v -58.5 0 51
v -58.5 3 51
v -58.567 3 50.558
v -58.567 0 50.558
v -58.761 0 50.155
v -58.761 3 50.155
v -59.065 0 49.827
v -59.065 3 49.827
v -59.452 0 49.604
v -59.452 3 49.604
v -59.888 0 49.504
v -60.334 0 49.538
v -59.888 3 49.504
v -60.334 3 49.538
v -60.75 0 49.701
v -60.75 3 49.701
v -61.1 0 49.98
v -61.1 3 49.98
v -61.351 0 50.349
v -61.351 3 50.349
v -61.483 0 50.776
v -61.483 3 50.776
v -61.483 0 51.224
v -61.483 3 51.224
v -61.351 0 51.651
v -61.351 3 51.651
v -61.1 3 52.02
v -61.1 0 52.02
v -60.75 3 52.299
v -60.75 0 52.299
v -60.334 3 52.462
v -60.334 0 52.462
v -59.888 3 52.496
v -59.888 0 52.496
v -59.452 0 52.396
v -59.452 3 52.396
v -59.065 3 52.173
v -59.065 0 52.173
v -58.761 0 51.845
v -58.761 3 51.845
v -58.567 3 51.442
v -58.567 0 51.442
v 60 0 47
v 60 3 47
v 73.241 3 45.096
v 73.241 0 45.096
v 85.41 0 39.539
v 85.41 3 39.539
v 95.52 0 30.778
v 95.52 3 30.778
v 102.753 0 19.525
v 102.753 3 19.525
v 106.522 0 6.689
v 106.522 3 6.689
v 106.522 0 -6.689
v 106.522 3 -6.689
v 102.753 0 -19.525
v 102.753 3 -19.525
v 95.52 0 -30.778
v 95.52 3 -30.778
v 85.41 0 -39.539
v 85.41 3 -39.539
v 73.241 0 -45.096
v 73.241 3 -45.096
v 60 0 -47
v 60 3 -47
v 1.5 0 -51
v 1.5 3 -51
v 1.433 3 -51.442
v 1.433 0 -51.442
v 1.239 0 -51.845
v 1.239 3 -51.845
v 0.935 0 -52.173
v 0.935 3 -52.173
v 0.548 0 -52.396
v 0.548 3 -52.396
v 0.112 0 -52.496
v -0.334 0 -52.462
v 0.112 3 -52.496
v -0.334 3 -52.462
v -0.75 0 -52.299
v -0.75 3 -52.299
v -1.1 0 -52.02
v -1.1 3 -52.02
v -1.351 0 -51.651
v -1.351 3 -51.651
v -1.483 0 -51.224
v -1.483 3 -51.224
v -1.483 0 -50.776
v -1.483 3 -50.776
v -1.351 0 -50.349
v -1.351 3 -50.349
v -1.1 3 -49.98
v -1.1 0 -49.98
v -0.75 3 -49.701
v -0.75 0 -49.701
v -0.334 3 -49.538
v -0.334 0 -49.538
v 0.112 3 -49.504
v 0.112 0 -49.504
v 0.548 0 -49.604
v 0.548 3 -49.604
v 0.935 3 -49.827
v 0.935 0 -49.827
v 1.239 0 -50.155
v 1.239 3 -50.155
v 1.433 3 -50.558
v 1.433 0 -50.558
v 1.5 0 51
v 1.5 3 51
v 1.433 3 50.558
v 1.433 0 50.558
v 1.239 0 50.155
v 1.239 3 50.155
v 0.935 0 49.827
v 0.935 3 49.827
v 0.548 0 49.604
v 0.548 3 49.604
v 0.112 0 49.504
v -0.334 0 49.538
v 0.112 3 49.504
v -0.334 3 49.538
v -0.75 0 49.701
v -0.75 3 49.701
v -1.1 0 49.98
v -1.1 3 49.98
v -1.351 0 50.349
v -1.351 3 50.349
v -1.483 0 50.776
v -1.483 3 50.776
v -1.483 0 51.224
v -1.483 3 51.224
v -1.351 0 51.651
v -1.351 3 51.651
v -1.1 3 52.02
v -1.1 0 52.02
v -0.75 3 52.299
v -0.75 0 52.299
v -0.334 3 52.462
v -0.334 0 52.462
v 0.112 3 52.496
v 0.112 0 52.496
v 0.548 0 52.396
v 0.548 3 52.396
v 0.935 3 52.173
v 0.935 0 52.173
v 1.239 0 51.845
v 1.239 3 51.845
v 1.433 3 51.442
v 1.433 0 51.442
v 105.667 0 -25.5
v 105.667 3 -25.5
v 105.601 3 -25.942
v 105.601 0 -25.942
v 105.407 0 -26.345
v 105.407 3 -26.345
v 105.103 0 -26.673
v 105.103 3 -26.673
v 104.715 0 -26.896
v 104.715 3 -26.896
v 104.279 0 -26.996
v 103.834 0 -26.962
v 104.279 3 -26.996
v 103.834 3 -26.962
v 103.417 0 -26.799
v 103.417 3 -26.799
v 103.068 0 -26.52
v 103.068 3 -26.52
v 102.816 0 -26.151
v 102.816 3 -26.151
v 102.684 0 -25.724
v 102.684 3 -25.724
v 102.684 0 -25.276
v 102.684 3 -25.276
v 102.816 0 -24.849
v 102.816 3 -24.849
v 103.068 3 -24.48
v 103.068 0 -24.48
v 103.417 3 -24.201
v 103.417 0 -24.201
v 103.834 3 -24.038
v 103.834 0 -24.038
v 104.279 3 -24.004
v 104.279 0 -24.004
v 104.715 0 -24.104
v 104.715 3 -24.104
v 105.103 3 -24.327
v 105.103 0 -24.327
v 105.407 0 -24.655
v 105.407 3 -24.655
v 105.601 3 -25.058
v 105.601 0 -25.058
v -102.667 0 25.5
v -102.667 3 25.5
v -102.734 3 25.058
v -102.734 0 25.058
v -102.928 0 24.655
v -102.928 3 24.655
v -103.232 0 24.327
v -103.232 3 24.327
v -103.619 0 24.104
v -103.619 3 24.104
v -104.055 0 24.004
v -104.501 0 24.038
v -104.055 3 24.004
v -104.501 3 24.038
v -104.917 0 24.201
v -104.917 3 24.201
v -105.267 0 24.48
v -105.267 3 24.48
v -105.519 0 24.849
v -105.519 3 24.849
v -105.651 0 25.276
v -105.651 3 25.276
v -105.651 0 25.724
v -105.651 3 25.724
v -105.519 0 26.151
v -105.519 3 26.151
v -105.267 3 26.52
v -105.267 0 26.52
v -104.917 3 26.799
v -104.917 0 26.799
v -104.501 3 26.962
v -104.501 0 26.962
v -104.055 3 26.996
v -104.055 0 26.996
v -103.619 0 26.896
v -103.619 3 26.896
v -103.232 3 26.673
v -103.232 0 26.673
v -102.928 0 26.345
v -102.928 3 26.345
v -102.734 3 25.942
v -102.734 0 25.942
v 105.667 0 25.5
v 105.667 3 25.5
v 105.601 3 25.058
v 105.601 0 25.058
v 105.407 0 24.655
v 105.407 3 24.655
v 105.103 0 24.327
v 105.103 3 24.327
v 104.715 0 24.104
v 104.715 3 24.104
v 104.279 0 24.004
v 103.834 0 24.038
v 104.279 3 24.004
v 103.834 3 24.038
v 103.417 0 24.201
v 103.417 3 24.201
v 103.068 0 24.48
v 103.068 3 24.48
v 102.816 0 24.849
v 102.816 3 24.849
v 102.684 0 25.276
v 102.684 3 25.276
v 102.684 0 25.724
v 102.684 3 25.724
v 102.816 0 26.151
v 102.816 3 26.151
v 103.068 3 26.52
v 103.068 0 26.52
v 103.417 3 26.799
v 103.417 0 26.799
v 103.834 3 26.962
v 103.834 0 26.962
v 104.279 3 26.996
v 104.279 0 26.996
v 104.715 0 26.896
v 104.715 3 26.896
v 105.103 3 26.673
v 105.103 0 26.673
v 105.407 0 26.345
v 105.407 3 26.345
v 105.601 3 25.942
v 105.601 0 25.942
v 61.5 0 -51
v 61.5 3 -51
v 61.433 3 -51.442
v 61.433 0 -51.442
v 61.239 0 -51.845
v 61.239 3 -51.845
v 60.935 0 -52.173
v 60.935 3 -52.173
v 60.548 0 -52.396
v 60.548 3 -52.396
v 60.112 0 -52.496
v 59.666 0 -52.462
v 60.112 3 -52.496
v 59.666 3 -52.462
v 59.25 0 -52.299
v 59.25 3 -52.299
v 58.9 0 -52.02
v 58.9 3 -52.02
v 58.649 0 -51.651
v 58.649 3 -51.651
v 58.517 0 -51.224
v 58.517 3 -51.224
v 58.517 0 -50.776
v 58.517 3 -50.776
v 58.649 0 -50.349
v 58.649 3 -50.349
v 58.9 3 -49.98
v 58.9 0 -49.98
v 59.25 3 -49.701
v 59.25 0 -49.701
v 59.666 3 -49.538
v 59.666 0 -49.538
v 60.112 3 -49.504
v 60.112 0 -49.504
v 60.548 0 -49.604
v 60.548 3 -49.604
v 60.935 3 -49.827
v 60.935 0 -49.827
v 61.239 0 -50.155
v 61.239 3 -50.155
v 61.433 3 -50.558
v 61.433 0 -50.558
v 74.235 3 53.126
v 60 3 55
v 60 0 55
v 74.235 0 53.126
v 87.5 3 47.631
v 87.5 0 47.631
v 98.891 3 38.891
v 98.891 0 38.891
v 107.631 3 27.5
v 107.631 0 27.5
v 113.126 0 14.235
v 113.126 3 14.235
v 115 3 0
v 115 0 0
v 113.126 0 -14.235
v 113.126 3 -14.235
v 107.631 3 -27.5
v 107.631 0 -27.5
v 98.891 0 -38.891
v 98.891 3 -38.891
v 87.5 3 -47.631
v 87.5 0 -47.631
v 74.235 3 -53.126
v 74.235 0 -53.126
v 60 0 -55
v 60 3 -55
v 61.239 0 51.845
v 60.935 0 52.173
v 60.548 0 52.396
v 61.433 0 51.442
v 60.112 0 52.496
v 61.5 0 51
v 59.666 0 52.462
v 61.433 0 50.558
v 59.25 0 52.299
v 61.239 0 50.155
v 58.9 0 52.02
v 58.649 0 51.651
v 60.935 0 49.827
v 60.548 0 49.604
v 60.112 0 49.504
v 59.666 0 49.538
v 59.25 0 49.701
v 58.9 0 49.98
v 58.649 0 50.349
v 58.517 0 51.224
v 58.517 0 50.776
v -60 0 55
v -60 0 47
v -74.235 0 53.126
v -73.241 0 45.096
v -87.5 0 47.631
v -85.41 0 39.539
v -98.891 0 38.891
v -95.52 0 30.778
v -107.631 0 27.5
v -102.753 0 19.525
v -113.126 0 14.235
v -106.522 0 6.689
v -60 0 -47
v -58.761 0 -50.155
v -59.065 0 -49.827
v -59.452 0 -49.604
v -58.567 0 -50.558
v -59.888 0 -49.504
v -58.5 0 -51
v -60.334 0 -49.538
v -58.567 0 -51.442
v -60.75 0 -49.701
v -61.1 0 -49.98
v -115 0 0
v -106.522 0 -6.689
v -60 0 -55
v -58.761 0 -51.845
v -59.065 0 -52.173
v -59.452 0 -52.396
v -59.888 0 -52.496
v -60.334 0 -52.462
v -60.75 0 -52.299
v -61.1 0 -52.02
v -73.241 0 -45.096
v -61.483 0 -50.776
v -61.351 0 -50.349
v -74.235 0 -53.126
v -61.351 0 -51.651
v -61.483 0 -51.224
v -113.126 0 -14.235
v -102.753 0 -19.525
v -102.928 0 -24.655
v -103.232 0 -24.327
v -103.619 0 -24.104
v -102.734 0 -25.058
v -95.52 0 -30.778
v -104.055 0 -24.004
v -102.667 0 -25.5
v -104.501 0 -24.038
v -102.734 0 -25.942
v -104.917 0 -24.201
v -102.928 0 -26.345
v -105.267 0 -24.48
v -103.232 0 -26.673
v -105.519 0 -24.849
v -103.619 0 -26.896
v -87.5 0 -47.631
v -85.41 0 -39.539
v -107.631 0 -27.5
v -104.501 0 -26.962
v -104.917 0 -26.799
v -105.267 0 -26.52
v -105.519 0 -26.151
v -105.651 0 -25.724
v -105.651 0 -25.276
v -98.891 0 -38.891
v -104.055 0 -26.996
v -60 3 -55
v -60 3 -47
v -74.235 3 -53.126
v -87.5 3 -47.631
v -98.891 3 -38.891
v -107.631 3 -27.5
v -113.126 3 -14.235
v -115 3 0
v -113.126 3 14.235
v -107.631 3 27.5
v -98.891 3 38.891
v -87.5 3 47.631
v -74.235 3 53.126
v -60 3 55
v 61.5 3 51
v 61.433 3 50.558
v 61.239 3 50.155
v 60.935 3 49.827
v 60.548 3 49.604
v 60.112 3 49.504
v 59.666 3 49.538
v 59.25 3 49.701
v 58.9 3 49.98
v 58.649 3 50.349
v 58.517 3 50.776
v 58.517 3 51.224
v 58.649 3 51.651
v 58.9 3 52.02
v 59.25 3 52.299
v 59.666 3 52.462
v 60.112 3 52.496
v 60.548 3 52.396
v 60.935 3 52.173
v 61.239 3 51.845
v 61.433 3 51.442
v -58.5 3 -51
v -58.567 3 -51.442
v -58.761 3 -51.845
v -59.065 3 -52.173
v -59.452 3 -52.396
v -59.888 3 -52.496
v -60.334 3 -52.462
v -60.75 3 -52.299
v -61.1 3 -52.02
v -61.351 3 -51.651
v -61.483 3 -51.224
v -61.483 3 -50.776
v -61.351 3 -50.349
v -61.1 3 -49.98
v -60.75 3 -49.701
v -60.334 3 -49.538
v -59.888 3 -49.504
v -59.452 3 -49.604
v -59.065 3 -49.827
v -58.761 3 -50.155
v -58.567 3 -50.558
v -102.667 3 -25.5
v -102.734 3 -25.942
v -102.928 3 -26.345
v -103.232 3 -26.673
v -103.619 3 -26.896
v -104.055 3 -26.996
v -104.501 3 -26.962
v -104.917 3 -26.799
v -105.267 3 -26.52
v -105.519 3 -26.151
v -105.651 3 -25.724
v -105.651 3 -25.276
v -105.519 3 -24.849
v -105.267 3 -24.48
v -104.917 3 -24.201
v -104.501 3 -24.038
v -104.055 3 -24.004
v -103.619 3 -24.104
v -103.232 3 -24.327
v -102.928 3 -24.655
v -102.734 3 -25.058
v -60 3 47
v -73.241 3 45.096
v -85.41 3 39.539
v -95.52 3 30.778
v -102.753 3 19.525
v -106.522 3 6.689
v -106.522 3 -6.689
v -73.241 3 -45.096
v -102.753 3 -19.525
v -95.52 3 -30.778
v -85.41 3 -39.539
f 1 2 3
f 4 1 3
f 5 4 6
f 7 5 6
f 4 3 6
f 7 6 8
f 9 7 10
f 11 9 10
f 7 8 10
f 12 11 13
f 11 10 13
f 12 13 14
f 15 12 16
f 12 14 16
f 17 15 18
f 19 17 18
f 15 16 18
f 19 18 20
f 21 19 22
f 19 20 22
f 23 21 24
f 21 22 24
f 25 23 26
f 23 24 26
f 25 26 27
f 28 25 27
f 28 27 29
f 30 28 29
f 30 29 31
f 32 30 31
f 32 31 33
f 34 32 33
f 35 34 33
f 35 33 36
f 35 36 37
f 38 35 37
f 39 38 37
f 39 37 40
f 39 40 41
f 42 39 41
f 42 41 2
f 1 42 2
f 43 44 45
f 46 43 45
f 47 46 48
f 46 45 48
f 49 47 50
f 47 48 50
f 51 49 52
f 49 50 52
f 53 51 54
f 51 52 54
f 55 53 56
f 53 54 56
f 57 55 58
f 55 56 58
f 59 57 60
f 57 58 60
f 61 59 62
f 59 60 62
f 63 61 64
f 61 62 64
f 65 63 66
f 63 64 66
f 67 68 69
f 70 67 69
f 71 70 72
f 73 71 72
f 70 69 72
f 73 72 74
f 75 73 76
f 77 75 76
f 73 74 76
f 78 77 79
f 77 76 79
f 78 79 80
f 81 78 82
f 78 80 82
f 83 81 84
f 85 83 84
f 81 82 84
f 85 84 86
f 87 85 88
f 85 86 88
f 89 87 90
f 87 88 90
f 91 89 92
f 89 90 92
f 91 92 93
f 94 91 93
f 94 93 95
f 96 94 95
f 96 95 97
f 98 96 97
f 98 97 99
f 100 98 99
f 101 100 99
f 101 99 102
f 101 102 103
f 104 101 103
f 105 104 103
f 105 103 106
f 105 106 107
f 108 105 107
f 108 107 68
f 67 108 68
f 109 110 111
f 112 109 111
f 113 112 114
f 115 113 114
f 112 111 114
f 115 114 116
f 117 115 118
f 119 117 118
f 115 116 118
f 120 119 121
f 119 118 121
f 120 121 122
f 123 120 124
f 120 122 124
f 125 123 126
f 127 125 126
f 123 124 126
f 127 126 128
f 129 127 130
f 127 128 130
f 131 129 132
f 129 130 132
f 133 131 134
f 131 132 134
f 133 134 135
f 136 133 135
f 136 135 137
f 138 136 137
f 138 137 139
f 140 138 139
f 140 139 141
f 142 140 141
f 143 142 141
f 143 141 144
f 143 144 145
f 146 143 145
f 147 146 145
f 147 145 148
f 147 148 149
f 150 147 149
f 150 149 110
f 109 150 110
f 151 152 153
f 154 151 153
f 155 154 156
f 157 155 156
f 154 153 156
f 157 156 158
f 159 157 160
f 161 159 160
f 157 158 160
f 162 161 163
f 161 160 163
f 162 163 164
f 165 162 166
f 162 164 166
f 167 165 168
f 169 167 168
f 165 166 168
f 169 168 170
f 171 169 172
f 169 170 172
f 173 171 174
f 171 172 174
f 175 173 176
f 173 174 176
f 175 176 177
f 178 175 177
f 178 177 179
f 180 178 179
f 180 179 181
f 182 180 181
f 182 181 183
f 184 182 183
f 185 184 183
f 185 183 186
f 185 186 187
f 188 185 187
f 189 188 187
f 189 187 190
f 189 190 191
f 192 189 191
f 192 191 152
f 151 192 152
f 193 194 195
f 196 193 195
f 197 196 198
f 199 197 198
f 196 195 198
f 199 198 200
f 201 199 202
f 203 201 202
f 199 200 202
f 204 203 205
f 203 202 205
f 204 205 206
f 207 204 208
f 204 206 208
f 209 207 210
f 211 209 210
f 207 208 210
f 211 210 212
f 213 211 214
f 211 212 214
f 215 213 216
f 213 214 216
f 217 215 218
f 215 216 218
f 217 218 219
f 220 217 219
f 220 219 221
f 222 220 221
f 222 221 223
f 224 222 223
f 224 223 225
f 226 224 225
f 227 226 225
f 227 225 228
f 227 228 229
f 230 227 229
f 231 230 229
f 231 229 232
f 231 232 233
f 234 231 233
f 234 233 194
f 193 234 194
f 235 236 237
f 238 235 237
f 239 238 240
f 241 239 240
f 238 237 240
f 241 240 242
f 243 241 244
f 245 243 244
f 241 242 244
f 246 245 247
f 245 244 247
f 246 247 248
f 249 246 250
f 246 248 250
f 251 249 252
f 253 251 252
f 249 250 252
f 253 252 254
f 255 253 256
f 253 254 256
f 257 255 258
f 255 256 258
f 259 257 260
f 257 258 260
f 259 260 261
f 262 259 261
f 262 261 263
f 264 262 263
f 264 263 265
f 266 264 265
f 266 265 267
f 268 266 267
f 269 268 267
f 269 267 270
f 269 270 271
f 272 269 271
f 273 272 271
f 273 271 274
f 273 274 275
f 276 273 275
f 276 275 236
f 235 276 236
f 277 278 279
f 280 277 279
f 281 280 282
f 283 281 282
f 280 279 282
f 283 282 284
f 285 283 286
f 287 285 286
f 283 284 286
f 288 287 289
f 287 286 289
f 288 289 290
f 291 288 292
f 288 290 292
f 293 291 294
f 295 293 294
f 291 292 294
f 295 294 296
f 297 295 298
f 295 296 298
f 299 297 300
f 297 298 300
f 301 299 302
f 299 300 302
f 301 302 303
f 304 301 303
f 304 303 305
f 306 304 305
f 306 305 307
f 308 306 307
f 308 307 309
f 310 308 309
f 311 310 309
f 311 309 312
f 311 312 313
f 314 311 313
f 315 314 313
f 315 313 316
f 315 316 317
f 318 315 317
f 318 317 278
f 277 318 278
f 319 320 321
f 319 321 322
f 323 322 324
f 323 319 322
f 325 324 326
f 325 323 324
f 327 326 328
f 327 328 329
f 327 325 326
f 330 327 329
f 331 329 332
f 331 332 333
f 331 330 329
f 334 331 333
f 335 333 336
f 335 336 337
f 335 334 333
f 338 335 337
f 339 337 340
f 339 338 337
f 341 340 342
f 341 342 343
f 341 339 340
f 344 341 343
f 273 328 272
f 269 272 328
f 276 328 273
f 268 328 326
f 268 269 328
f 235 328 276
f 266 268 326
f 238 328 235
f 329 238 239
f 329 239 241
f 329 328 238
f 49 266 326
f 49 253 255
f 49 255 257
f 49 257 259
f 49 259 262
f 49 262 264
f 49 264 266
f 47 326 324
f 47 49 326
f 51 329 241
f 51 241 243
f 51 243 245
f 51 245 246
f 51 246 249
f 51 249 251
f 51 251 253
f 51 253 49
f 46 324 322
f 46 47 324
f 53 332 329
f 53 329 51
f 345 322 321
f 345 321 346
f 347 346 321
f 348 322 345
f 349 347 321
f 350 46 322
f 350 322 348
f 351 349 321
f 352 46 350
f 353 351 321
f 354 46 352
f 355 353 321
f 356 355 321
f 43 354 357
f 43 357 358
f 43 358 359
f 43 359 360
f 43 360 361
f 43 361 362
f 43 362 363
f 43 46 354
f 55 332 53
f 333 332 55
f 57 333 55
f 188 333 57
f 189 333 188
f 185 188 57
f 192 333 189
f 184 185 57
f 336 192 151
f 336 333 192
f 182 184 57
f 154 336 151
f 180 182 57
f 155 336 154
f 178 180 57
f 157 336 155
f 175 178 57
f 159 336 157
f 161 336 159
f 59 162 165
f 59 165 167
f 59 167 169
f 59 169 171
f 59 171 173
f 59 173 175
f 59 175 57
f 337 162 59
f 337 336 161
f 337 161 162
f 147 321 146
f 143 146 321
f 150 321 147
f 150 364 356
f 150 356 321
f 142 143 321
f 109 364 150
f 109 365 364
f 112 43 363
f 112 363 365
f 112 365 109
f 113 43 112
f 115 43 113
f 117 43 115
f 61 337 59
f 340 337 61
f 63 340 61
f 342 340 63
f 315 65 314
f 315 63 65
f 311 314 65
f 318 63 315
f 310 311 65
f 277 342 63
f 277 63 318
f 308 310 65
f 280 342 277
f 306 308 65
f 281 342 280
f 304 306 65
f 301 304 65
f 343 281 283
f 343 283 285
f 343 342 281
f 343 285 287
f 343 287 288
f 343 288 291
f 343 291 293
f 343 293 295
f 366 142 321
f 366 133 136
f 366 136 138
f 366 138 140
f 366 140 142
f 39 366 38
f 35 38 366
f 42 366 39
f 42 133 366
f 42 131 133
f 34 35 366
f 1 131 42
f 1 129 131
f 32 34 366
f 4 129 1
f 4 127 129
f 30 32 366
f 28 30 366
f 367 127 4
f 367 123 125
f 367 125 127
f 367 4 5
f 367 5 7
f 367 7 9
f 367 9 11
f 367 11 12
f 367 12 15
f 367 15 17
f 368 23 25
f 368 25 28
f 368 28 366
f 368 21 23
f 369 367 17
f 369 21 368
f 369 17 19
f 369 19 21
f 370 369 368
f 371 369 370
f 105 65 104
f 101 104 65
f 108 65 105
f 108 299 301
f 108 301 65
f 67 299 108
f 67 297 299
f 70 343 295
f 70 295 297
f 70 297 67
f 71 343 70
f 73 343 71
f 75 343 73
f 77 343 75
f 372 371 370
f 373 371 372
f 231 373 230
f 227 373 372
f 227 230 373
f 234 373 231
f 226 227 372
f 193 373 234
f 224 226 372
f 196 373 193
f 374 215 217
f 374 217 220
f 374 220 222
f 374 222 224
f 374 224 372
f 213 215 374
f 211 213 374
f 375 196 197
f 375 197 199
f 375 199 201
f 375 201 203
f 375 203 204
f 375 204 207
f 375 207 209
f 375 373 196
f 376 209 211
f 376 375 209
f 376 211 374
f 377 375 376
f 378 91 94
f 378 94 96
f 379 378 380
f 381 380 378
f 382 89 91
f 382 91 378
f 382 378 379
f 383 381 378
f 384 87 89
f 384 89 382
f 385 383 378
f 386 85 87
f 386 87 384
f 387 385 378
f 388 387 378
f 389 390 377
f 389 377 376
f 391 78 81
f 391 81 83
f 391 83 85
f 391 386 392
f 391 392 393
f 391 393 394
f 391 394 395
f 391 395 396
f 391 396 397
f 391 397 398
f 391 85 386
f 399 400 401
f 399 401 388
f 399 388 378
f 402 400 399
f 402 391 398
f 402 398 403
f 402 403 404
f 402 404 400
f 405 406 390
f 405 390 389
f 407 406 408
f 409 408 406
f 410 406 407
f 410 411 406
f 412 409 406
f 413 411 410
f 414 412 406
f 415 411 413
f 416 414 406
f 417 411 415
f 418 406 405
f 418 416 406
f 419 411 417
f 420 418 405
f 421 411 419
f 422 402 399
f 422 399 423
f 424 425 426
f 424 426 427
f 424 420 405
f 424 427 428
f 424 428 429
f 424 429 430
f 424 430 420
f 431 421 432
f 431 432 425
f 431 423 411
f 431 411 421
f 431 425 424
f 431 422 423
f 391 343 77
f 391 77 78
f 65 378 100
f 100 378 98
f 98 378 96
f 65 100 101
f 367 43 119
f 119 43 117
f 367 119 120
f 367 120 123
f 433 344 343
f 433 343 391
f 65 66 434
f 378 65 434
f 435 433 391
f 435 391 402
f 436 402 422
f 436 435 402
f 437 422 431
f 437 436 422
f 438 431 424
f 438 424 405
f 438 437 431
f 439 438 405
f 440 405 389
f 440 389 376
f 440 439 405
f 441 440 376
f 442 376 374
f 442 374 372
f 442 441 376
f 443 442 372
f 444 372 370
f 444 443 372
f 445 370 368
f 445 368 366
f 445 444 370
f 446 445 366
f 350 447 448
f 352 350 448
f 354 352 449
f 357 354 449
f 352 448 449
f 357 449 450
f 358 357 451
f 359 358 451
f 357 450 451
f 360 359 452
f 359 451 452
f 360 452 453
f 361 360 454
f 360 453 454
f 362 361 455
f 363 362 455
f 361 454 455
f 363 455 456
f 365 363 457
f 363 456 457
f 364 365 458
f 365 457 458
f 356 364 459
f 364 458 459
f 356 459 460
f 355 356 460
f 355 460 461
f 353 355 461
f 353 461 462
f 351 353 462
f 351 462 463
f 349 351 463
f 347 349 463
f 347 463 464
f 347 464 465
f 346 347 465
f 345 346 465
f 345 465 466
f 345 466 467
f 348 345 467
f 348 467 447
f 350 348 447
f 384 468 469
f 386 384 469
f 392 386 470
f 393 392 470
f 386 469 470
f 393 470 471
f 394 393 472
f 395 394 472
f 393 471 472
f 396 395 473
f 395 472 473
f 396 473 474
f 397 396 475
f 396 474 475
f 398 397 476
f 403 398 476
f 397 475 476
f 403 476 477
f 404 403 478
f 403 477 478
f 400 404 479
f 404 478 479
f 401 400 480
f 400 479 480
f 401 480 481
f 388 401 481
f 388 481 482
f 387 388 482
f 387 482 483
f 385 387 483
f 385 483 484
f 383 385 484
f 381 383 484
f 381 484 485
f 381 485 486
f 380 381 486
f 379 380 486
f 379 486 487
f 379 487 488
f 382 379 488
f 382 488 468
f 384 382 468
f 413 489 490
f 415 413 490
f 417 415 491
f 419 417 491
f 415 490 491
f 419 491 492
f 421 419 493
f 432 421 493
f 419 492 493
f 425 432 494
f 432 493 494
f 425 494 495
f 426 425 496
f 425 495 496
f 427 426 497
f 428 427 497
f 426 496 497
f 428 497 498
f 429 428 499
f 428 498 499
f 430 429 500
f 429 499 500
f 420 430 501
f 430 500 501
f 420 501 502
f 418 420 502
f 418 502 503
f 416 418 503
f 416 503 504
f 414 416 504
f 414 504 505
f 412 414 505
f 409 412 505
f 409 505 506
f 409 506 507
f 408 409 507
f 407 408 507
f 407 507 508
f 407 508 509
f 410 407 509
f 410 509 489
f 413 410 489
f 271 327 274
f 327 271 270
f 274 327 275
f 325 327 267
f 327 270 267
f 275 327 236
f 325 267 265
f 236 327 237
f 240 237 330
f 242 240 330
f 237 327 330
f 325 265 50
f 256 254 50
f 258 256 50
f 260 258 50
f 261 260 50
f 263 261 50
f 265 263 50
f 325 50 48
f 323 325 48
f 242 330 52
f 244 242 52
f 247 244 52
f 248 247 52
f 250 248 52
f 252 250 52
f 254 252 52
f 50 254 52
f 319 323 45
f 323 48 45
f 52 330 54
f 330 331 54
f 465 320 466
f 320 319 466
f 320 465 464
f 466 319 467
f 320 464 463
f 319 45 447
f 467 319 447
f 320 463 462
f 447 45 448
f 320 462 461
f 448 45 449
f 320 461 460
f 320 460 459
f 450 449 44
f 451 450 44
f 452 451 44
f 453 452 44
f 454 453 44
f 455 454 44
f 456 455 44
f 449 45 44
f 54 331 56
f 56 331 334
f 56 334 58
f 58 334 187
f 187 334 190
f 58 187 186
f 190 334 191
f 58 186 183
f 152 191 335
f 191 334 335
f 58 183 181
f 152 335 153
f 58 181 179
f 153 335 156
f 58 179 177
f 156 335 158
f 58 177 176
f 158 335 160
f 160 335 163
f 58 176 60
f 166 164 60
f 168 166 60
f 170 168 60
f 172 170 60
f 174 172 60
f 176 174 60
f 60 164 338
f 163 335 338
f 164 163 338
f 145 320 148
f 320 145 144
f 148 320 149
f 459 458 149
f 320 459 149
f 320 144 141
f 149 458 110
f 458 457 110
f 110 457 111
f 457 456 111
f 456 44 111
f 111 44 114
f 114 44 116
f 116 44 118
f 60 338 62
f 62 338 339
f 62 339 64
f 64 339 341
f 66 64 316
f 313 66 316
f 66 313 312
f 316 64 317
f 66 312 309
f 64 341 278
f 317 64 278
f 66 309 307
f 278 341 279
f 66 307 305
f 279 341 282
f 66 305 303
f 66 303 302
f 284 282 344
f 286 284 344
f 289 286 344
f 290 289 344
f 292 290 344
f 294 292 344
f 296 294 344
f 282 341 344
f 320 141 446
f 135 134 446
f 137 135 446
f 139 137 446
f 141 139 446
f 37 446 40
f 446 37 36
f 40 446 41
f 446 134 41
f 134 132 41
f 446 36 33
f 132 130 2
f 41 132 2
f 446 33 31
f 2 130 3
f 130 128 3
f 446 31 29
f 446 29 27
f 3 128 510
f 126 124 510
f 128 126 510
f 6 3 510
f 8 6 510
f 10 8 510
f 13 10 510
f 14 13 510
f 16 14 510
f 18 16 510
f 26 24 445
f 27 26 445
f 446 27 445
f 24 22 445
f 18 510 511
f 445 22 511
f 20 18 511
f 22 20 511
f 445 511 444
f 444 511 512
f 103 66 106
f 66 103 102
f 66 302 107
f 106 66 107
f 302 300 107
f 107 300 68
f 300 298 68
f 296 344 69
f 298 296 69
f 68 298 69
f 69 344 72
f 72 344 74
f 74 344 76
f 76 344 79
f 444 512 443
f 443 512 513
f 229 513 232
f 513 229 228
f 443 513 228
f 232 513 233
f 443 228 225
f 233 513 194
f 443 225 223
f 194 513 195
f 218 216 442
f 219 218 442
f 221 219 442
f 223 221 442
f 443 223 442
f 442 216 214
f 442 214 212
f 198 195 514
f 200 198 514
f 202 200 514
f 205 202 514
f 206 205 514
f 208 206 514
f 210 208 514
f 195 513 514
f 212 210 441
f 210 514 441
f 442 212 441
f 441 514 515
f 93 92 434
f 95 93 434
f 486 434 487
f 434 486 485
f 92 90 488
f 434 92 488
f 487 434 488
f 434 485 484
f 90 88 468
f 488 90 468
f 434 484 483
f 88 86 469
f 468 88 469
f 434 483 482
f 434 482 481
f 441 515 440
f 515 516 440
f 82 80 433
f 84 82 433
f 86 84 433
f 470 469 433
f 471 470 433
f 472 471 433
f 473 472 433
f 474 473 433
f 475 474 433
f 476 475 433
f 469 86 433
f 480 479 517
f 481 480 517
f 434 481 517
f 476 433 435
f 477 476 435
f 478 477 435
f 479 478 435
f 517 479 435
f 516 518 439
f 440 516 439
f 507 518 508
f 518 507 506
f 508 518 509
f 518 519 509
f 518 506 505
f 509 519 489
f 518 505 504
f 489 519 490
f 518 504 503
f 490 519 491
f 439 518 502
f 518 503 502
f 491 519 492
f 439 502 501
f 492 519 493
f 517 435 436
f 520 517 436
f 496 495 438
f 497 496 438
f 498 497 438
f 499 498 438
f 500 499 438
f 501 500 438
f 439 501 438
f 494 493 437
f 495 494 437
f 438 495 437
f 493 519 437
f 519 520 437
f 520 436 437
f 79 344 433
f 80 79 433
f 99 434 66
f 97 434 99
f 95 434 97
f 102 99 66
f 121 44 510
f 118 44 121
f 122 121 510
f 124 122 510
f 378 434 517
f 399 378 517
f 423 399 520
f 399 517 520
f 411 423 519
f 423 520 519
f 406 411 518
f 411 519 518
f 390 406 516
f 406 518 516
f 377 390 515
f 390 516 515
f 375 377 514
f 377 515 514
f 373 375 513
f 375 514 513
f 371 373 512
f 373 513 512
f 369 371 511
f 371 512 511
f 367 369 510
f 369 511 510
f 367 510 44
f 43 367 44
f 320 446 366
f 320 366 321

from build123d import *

# Parameters (mm, degrees)
SKETCH_1_R          = 1.5
EXTRUDE_2_DEPTH     = 3
CUT_EXTRUDE_1_DEPTH = 10
SKETCH_4_R          = 5
CUT_EXTRUDE_2_DEPTH = 10
SKETCH_5_R          = 1.5
CUT_EXTRUDE_3_DEPTH = 10
CUT_EXTRUDE_4_DEPTH = 10


with BuildPart() as part:
    # 草图1 → 凸台-拉伸2 (new body)
    with BuildSketch(Plane(origin=(0, 0, 0), x_dir=(1, 0, 0), z_dir=(0, 1, 0))):
        with BuildLine():
            Line((-60, 70), (60, 70))
            ThreePointArc((60, 70), (130, 0), (60, -70))
            Line((60, -70), (-60, -70))
            ThreePointArc((-60, -70), (-130, 0), (-60, 70))
        make_face()
        with Locations((-122, 0)):
            Circle(SKETCH_1_R, mode=Mode.SUBTRACT)
        with Locations((122, 0)):
            Circle(SKETCH_1_R, mode=Mode.SUBTRACT)
        with Locations((-30, 60)):
            Circle(SKETCH_1_R, mode=Mode.SUBTRACT)
        with Locations((30, 60)):
            Circle(SKETCH_1_R, mode=Mode.SUBTRACT)
        with Locations((30, -60)):
            Circle(SKETCH_1_R, mode=Mode.SUBTRACT)
        with Locations((-30, -60)):
            Circle(SKETCH_1_R, mode=Mode.SUBTRACT)
    extrude(amount=EXTRUDE_2_DEPTH)

    # 草图3 → 切除-拉伸1 (cut)
    with BuildSketch(Plane(origin=(0, 3, 0), x_dir=(1, 0, 0), z_dir=(0, 1, 0))):
        with BuildLine():
            Line((-60, -70), (60, -70))
            ThreePointArc((60, -70), (130, 0), (60, 70))
            Line((60, 70), (-60, 70))
            ThreePointArc((-60, 70), (-130, 0), (-60, -70))
        make_face()
        with BuildLine():
            Line((-60, -55), (60, -55))
            ThreePointArc((60, -55), (115, 0), (60, 55))
            Line((60, 55), (-60, 55))
            ThreePointArc((-60, 55), (-115, 0), (-60, -55))
        make_face(mode=Mode.SUBTRACT)
    extrude(amount=-CUT_EXTRUDE_1_DEPTH, mode=Mode.SUBTRACT)

    # 草图4 → 切除-拉伸2 (cut)
    with BuildSketch(Plane(origin=(0, 3, 0), x_dir=(1, 0, 0), z_dir=(0, 1, 0))):
        with Locations((-60, 35)):
            Circle(SKETCH_4_R)
        with Locations((-60, -35)):
            Circle(SKETCH_4_R)
        with Locations((-80.57248383, -28.315594803)):
            Circle(SKETCH_4_R)
        with Locations((-93.28697807, -10.815594803)):
            Circle(SKETCH_4_R)
        with Locations((-93.28697807, 10.815594803)):
            Circle(SKETCH_4_R)
        with Locations((-80.57248383, 28.315594803)):
            Circle(SKETCH_4_R)
        with Locations((-40, 35)):
            Circle(SKETCH_4_R)
        with Locations((-20, 35)):
            Circle(SKETCH_4_R)
        with Locations((0, 35)):
            Circle(SKETCH_4_R)
        with Locations((20, 35)):
            Circle(SKETCH_4_R)
        with Locations((40, 35)):
            Circle(SKETCH_4_R)
        with Locations((60, 35)):
            Circle(SKETCH_4_R)
        with Locations((60, -35)):
            Circle(SKETCH_4_R)
        with Locations((40, -35)):
            Circle(SKETCH_4_R)
        with Locations((20, -35)):
            Circle(SKETCH_4_R)
        with Locations((0, -35)):
            Circle(SKETCH_4_R)
        with Locations((-20, -35)):
            Circle(SKETCH_4_R)
        with Locations((-40, -35)):
            Circle(SKETCH_4_R)
        with Locations((80.57248383, 28.315594803)):
            Circle(SKETCH_4_R)
        with Locations((93.28697807, 10.815594803)):
            Circle(SKETCH_4_R)
        with Locations((93.28697807, -10.815594803)):
            Circle(SKETCH_4_R)
        with Locations((80.57248383, -28.315594803)):
            Circle(SKETCH_4_R)
    extrude(amount=-CUT_EXTRUDE_2_DEPTH, mode=Mode.SUBTRACT)

    # 草图5 → 切除-拉伸3 (cut)
    with BuildSketch(Plane(origin=(0, 3, 0), x_dir=(1, 0, 0), z_dir=(0, 1, 0))):
        with Locations((60, 51)):
            Circle(SKETCH_5_R)
        with Locations((104.167295593, 25.5)):
            Circle(SKETCH_5_R)
        with Locations((104.167295593, -25.5)):
            Circle(SKETCH_5_R)
        with Locations((60, -51)):
            Circle(SKETCH_5_R)
        with Locations((0, -51)):
            Circle(SKETCH_5_R)
        with Locations((-60, -51)):
            Circle(SKETCH_5_R)
        with Locations((-104.167295593, -25.5)):
            Circle(SKETCH_5_R)
        with Locations((-104.167295593, 25.5)):
            Circle(SKETCH_5_R)
        with Locations((-60, 51)):
            Circle(SKETCH_5_R)
        with Locations((0, 51)):
            Circle(SKETCH_5_R)
    extrude(amount=-CUT_EXTRUDE_3_DEPTH, mode=Mode.SUBTRACT)

    # 草图6 → 切除-拉伸4 (cut)
    with BuildSketch(Plane(origin=(0, 3, 0), x_dir=(1, 0, 0), z_dir=(0, 1, 0))):
        with BuildLine():
            Line((60, 47), (-60, 47))
            ThreePointArc((-60, 47), (-107, 0), (-60, -47))
            Line((-60, -47), (60, -47))
            ThreePointArc((60, -47), (107, 0), (60, 47))
        make_face()
    extrude(amount=-CUT_EXTRUDE_4_DEPTH, mode=Mode.SUBTRACT)


solid = part.part
